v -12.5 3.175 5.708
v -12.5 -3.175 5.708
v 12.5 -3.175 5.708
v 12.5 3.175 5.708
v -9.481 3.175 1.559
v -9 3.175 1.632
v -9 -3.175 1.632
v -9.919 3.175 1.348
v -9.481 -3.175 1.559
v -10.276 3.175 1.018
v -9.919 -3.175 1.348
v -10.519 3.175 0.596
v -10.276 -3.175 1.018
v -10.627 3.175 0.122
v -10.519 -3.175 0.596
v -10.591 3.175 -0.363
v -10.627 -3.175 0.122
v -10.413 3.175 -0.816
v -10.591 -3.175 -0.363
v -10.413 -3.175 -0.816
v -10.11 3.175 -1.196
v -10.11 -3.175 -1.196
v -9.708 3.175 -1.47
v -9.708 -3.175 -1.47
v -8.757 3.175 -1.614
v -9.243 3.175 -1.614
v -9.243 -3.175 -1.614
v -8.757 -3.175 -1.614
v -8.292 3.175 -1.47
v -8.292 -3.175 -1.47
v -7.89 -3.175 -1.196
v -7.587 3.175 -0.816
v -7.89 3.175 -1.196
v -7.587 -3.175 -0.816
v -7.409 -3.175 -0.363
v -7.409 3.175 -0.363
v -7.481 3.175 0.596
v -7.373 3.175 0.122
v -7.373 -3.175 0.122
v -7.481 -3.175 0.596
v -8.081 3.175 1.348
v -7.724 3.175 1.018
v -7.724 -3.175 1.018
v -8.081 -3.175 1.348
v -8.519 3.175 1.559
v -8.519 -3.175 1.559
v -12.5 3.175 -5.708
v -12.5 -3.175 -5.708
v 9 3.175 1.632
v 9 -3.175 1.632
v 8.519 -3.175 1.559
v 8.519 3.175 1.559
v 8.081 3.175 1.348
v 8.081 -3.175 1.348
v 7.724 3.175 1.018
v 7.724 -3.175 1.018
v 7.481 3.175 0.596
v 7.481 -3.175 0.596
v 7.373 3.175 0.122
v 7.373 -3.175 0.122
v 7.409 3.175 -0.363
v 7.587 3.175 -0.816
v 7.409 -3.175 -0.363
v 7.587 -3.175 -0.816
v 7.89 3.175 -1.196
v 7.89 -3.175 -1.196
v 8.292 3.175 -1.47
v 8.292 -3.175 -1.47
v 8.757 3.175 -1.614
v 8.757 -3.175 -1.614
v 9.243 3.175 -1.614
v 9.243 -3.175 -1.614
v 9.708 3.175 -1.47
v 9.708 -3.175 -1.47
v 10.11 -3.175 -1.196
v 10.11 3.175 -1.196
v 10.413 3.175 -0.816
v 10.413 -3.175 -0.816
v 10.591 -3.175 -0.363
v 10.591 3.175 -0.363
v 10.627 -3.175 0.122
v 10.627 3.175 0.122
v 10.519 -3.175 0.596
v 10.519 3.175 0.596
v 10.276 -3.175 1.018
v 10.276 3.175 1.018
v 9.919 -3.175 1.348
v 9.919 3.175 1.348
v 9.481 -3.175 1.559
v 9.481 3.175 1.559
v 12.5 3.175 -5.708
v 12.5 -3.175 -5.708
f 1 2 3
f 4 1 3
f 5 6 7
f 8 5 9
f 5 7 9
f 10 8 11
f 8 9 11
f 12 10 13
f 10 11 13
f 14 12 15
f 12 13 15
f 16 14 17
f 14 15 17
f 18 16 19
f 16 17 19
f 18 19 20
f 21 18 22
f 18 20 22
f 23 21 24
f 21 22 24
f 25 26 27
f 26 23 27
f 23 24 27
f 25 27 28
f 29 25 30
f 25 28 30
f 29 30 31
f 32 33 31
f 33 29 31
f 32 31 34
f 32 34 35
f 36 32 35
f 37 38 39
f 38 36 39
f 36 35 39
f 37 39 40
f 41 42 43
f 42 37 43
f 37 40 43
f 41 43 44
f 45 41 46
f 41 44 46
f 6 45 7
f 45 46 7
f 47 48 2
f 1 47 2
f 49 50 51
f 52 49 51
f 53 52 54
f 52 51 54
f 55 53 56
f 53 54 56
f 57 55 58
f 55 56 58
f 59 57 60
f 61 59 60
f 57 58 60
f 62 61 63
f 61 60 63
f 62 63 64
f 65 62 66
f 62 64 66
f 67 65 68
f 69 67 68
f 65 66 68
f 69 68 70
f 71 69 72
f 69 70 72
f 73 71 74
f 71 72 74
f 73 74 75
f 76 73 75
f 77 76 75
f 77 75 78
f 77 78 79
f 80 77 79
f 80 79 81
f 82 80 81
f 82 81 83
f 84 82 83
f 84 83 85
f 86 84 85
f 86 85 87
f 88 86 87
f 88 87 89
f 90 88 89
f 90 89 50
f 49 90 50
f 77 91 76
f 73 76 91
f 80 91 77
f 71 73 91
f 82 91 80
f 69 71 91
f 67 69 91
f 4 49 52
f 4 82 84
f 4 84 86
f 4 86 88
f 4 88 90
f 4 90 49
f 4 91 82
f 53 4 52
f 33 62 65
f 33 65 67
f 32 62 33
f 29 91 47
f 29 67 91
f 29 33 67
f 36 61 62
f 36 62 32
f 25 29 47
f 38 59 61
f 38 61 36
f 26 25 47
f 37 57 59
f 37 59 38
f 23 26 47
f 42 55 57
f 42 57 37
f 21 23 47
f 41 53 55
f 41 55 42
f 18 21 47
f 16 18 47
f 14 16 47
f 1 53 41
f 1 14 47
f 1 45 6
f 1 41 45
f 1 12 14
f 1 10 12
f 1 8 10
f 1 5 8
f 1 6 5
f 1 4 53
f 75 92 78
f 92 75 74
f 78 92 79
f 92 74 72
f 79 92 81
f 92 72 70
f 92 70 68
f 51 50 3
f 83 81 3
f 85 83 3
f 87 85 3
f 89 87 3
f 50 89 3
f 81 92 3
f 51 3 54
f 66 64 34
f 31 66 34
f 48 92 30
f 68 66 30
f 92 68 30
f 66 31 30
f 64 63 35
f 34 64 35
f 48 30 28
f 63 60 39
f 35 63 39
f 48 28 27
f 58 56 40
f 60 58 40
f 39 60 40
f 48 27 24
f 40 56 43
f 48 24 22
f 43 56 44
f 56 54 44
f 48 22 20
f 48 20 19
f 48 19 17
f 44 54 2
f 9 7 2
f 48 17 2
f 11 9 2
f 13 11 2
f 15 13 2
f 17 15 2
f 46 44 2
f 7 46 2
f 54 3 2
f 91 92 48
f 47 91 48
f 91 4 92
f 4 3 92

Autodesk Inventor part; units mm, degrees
ref_plane "YZ Plane" through (0, 0, 0) normal (1, 0, 0) x (0, 1, 0)
ref_plane "XZ Plane" through (0, 0, 0) normal (0, 1, 0) x (-1, 0, 0)
ref_plane "XY Plane" through (0, 0, 0) normal (0, 0, 1) x (1, 0, 0)
sketch "Sketch4" plane through (0, 0, 0) normal (0, 1, 0) x (-1, 0, 0)
  line L0 (-12.5, -5.708) -> (12.5, -5.708)
  line L1 (12.5, -5.708) -> (12.5, 5.708)
  line L2 (12.5, 5.708) -> (-12.5, 5.708)
  line L3 (-12.5, 5.708) -> (-12.5, -5.708)
  line L4 (-12.5, -5.708) -> (12.5, 5.708) construction
  line L5 (12.5, -5.708) -> (-12.5, 5.708) construction
  point P0 (0, 0)
  dimension "d22" = 11.416
  dimension "d23" = 25
extrude "Extrusion3" add sketch "Sketch4" along normal mid plane 6.35
sketch "Sketch5" plane through (0, 3.175, 0) normal (0, 1, 0) x (1, 0, 0)
  line L0 (12.5, 5.708) -> (-12.5, 5.708) projected
  line L1 (-12.5, 5.708) -> (-12.5, -5.708) projected
  line L2 (-12.5, -5.708) -> (12.5, -5.708) projected
  line L3 (12.5, -5.708) -> (12.5, 5.708) projected
  line L4 (9, 0) -> (0, 0)
  dimension "d26" = 9
hole "Hole2" at (9, 3.175, 0) direction (0, -1, 0) diameter 3.264 end through all clearance for "Socket Head Cap Screw" size "#4" standard "Ansi Unified Screw Threads"
mirror "Mirror2" about plane through (0, 0, 0) normal (1, 0, 0) of "Hole2"
equation "\"d22\" = 2 * silveringThickness + ScintillatorThickness + 2 * rubberizedCoating"
equation "\"d26\" = MountingScrewOffsett"
equation "\"OpticalFiberClearence\" = 0.071"
equation "\"ScintillatorEdgeClearence\" = 3"
equation "\"ShallowTrackDepth\" = 1.142"
equation "\"DeepTrackDepth\" = 5.571"
equation "\"FiberEdgeOffsett\" = 5"
equation "\"LoopLargeTrackRatio\" = 1.1"
equation "\"FiberSensorClerence\" = 0.5"
equation "\"MountingScrewOffsett\" = 9"
equation "\"silveringThickness\" = 0.2"
equation "\"mppcMountDepth\" = 6.35"
equation "\"ScintillatorThickness\" = 10"
properties part number "suppourtBlock" material "Aluminum 6061"
